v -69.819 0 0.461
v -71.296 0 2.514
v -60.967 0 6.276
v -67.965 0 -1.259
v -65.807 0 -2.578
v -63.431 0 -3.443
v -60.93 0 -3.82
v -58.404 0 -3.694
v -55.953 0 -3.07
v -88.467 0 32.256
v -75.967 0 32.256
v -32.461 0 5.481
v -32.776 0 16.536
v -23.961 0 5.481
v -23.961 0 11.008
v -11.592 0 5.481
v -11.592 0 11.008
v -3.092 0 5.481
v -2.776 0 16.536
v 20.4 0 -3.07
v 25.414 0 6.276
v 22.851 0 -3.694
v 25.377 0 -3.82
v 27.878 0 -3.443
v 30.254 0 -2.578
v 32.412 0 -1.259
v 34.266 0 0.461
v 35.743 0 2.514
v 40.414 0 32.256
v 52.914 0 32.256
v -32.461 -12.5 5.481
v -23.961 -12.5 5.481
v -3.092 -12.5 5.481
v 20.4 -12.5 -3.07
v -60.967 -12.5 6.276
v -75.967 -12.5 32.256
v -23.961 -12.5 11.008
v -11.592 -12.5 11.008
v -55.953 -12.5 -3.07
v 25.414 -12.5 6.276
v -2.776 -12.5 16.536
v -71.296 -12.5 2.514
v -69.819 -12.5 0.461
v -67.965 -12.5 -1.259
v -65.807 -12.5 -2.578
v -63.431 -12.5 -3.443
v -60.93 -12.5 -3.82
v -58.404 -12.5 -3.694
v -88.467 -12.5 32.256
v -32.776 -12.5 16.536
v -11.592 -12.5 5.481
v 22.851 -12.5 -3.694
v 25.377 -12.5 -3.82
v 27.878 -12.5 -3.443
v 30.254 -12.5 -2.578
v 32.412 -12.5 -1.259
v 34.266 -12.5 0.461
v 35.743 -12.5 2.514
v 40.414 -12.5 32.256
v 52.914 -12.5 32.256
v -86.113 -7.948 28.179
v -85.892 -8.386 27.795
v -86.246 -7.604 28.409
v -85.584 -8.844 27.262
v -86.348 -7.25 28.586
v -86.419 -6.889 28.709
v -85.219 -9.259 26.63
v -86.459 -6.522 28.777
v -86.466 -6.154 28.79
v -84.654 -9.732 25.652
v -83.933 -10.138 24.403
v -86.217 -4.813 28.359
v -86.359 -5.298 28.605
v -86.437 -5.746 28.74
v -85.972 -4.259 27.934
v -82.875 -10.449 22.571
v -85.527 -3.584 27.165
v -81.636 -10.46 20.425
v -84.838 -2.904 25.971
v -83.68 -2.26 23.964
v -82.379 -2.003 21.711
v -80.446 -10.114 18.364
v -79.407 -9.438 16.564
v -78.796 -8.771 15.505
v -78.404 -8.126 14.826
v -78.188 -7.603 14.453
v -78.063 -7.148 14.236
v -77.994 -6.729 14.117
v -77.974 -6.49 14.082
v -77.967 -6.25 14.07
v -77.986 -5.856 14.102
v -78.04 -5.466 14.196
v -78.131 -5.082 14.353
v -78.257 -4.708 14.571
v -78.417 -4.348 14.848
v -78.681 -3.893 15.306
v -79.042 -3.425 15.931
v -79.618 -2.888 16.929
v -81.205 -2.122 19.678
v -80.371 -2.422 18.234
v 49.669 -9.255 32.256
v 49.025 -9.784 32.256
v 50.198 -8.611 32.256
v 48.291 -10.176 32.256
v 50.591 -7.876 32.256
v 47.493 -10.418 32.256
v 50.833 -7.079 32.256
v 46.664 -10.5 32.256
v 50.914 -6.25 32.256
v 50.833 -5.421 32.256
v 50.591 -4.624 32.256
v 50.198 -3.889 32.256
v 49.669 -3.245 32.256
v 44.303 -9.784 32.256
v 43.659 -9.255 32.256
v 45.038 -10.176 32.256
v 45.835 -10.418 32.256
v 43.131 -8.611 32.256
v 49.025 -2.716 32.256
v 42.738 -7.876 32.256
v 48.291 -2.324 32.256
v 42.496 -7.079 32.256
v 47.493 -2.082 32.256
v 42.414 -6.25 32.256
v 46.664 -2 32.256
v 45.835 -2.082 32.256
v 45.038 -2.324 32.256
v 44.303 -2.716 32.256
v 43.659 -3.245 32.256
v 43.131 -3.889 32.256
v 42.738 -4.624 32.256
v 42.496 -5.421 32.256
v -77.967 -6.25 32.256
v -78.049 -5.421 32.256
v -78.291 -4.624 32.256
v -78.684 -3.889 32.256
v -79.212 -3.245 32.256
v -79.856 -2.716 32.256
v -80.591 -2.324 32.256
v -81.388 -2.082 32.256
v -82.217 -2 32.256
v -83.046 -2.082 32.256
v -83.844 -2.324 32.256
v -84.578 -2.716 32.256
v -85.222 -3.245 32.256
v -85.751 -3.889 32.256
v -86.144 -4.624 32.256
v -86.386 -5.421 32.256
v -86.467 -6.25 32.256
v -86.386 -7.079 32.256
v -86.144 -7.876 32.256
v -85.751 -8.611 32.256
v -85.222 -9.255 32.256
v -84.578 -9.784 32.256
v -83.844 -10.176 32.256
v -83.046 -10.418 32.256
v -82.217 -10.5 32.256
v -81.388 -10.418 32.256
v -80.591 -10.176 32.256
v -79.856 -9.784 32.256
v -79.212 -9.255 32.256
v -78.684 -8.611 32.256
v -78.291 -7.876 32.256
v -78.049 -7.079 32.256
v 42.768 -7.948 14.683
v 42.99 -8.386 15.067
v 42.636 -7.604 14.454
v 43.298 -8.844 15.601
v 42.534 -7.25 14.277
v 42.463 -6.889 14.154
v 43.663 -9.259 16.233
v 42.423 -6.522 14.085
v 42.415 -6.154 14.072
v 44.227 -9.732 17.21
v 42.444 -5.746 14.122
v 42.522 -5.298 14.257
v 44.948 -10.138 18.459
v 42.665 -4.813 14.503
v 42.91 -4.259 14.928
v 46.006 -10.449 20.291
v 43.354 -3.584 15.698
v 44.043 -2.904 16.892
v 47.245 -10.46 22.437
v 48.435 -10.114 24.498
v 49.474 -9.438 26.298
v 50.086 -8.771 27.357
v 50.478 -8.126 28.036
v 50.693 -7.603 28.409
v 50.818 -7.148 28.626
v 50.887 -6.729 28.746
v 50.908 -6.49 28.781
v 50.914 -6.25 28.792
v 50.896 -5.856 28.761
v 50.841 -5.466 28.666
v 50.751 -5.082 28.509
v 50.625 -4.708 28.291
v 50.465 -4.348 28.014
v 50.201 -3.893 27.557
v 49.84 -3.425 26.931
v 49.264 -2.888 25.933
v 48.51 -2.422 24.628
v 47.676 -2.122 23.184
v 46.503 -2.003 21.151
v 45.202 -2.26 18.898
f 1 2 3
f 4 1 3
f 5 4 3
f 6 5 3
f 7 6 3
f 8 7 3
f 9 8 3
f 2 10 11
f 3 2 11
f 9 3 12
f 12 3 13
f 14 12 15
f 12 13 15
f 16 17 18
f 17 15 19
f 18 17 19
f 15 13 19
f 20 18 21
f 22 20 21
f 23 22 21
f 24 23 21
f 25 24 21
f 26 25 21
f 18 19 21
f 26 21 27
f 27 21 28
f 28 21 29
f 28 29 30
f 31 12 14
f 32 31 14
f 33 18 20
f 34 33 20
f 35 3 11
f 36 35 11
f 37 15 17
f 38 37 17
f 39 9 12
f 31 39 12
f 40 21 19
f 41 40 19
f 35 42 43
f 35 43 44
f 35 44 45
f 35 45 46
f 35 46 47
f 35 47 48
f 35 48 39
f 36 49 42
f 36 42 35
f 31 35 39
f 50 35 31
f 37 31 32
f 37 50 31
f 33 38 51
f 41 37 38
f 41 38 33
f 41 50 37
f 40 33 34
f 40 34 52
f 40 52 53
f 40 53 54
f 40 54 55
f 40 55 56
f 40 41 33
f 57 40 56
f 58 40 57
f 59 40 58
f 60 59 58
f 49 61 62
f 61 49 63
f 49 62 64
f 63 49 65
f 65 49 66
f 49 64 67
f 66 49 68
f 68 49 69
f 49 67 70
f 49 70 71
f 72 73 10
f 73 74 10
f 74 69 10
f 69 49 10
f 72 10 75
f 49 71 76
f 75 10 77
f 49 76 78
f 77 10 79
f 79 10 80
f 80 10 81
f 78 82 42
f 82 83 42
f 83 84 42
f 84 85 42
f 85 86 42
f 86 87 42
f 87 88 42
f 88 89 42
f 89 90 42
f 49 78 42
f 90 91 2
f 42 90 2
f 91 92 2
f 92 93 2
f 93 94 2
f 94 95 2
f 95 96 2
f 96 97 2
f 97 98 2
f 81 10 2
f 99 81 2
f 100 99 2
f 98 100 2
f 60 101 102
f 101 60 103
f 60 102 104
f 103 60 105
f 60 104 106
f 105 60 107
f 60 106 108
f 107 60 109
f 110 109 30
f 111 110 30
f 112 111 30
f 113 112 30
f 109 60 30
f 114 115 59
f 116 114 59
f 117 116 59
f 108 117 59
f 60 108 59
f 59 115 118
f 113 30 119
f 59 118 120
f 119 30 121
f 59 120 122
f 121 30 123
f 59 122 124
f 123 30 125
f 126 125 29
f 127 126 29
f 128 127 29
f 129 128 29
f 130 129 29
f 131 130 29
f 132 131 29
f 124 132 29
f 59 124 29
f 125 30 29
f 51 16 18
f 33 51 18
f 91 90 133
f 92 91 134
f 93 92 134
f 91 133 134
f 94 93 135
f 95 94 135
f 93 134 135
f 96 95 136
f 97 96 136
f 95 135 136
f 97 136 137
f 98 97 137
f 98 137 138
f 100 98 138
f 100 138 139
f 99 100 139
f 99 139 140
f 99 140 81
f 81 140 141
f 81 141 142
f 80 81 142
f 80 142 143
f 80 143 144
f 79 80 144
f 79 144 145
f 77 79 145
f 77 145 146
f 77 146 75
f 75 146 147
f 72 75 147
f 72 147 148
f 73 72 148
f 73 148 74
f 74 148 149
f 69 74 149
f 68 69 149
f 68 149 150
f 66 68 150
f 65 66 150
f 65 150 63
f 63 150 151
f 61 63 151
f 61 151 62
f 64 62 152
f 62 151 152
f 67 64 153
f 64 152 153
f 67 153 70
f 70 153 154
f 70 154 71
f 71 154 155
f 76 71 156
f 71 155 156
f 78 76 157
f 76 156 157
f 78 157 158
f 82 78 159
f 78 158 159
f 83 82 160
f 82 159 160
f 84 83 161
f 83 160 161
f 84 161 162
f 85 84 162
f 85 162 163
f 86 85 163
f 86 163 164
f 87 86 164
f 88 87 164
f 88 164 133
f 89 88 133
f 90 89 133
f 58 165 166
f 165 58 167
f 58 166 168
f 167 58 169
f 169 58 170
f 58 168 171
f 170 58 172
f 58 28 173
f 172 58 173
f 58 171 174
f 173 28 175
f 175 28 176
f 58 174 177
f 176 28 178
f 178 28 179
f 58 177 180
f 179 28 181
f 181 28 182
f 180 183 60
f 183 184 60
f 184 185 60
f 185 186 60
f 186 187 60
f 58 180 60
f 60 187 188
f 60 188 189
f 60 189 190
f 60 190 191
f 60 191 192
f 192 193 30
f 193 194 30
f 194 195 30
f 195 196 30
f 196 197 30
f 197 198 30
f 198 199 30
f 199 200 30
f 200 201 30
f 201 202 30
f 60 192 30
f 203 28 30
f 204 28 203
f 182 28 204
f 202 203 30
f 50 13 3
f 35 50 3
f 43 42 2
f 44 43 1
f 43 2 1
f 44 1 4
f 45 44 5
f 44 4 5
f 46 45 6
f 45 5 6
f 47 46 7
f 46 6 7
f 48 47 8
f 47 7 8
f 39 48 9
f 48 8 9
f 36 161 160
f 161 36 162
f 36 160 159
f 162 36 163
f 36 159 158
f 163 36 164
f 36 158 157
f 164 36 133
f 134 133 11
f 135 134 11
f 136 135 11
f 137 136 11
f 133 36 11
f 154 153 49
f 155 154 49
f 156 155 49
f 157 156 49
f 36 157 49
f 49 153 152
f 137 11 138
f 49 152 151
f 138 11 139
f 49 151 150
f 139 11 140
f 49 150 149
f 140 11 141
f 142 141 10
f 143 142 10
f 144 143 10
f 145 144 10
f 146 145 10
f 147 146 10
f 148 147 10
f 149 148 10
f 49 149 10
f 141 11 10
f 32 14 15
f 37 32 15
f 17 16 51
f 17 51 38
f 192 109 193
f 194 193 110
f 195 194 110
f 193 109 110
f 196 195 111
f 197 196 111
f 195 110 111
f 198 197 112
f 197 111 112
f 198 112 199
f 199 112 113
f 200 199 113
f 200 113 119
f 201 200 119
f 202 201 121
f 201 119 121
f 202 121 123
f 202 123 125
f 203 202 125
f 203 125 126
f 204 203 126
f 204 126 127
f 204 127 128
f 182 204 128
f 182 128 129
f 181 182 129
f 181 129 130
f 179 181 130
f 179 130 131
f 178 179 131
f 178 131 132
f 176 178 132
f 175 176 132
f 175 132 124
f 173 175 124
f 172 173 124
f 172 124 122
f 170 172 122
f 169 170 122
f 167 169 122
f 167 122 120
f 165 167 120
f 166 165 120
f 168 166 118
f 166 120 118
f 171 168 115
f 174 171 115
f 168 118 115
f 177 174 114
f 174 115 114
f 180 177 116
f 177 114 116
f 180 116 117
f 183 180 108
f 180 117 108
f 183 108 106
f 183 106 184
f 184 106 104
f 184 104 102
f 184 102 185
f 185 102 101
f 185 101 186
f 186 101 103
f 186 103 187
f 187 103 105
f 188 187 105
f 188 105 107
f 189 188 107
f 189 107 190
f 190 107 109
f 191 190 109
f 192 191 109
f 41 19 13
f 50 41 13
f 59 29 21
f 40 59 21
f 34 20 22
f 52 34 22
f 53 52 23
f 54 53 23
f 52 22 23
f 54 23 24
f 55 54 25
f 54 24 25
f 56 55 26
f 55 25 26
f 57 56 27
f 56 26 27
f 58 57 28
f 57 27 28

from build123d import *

# Parameters (mm, degrees)
F1_DEPTH = 12.5
F3_R     = 4.25
F4_DEPTH = 25.4
F2_R     = 4.25
F5_DEPTH = 54.356
F6_W     = 12.369135
F6_H     = 5.527861
F7_DEPTH = 25.4


with BuildPart() as f1:
    # F0 (on Front) → F1 (new body)
    with BuildSketch(Plane.XZ):
        with BuildLine():
            Line((-2.776492, 16.536297), (-32.776492, 16.536297))
            Line((-32.776492, 16.536297), (-60.96727, 6.275693))
            Line((-60.96727, 6.275693), (-75.96727, 32.256455))
            Line((-75.96727, 32.256455), (-88.46727, 32.256455))
            Line((-88.46727, 32.256455), (-71.295553, 2.514168))
            ThreePointArc((-71.295553, 2.514168), (-64.640686, -3.069928), (-55.953374, -3.069928))
            Line((-55.953374, -3.069928), (-32.461059, 5.480576))
            Line((-32.461059, 5.480576), (-3.091924, 5.480576))
            Line((-3.091924, 5.480576), (20.400391, -3.069928))
            ThreePointArc((20.400391, -3.069928), (29.087703, -3.069928), (35.74257, 2.514168))
            Line((35.74257, 2.514168), (52.914287, 32.256455))
            Line((52.914287, 32.256455), (40.414287, 32.256455))
            Line((40.414287, 32.256455), (25.414287, 6.275693))
            Line((25.414287, 6.275693), (-2.776492, 16.536297))
        make_face()
    extrude(amount=F1_DEPTH)

    # F3 (on face) → F4 (cut)
    with BuildSketch(Plane.XY.offset(32.256455)):
        with Locations((-82.21727, -6.25)):
            Circle(F3_R)
    extrude(amount=-F4_DEPTH, mode=Mode.SUBTRACT)

    # F2 (on face) → F5 (cut)
    with BuildSketch(Plane.XY.offset(32.256455)):
        with Locations((46.664287, -6.25)):
            Circle(F2_R)
    extrude(amount=-F5_DEPTH, mode=Mode.SUBTRACT)

    # F6 (on face) → F7 (cut)
    with BuildSketch(Plane.XZ.offset(12.5)):
        with Locations((-17.776491, 8.244506)):
            Rectangle(F6_W, F6_H)
    extrude(amount=-F7_DEPTH, mode=Mode.SUBTRACT)


solid = f1.part
